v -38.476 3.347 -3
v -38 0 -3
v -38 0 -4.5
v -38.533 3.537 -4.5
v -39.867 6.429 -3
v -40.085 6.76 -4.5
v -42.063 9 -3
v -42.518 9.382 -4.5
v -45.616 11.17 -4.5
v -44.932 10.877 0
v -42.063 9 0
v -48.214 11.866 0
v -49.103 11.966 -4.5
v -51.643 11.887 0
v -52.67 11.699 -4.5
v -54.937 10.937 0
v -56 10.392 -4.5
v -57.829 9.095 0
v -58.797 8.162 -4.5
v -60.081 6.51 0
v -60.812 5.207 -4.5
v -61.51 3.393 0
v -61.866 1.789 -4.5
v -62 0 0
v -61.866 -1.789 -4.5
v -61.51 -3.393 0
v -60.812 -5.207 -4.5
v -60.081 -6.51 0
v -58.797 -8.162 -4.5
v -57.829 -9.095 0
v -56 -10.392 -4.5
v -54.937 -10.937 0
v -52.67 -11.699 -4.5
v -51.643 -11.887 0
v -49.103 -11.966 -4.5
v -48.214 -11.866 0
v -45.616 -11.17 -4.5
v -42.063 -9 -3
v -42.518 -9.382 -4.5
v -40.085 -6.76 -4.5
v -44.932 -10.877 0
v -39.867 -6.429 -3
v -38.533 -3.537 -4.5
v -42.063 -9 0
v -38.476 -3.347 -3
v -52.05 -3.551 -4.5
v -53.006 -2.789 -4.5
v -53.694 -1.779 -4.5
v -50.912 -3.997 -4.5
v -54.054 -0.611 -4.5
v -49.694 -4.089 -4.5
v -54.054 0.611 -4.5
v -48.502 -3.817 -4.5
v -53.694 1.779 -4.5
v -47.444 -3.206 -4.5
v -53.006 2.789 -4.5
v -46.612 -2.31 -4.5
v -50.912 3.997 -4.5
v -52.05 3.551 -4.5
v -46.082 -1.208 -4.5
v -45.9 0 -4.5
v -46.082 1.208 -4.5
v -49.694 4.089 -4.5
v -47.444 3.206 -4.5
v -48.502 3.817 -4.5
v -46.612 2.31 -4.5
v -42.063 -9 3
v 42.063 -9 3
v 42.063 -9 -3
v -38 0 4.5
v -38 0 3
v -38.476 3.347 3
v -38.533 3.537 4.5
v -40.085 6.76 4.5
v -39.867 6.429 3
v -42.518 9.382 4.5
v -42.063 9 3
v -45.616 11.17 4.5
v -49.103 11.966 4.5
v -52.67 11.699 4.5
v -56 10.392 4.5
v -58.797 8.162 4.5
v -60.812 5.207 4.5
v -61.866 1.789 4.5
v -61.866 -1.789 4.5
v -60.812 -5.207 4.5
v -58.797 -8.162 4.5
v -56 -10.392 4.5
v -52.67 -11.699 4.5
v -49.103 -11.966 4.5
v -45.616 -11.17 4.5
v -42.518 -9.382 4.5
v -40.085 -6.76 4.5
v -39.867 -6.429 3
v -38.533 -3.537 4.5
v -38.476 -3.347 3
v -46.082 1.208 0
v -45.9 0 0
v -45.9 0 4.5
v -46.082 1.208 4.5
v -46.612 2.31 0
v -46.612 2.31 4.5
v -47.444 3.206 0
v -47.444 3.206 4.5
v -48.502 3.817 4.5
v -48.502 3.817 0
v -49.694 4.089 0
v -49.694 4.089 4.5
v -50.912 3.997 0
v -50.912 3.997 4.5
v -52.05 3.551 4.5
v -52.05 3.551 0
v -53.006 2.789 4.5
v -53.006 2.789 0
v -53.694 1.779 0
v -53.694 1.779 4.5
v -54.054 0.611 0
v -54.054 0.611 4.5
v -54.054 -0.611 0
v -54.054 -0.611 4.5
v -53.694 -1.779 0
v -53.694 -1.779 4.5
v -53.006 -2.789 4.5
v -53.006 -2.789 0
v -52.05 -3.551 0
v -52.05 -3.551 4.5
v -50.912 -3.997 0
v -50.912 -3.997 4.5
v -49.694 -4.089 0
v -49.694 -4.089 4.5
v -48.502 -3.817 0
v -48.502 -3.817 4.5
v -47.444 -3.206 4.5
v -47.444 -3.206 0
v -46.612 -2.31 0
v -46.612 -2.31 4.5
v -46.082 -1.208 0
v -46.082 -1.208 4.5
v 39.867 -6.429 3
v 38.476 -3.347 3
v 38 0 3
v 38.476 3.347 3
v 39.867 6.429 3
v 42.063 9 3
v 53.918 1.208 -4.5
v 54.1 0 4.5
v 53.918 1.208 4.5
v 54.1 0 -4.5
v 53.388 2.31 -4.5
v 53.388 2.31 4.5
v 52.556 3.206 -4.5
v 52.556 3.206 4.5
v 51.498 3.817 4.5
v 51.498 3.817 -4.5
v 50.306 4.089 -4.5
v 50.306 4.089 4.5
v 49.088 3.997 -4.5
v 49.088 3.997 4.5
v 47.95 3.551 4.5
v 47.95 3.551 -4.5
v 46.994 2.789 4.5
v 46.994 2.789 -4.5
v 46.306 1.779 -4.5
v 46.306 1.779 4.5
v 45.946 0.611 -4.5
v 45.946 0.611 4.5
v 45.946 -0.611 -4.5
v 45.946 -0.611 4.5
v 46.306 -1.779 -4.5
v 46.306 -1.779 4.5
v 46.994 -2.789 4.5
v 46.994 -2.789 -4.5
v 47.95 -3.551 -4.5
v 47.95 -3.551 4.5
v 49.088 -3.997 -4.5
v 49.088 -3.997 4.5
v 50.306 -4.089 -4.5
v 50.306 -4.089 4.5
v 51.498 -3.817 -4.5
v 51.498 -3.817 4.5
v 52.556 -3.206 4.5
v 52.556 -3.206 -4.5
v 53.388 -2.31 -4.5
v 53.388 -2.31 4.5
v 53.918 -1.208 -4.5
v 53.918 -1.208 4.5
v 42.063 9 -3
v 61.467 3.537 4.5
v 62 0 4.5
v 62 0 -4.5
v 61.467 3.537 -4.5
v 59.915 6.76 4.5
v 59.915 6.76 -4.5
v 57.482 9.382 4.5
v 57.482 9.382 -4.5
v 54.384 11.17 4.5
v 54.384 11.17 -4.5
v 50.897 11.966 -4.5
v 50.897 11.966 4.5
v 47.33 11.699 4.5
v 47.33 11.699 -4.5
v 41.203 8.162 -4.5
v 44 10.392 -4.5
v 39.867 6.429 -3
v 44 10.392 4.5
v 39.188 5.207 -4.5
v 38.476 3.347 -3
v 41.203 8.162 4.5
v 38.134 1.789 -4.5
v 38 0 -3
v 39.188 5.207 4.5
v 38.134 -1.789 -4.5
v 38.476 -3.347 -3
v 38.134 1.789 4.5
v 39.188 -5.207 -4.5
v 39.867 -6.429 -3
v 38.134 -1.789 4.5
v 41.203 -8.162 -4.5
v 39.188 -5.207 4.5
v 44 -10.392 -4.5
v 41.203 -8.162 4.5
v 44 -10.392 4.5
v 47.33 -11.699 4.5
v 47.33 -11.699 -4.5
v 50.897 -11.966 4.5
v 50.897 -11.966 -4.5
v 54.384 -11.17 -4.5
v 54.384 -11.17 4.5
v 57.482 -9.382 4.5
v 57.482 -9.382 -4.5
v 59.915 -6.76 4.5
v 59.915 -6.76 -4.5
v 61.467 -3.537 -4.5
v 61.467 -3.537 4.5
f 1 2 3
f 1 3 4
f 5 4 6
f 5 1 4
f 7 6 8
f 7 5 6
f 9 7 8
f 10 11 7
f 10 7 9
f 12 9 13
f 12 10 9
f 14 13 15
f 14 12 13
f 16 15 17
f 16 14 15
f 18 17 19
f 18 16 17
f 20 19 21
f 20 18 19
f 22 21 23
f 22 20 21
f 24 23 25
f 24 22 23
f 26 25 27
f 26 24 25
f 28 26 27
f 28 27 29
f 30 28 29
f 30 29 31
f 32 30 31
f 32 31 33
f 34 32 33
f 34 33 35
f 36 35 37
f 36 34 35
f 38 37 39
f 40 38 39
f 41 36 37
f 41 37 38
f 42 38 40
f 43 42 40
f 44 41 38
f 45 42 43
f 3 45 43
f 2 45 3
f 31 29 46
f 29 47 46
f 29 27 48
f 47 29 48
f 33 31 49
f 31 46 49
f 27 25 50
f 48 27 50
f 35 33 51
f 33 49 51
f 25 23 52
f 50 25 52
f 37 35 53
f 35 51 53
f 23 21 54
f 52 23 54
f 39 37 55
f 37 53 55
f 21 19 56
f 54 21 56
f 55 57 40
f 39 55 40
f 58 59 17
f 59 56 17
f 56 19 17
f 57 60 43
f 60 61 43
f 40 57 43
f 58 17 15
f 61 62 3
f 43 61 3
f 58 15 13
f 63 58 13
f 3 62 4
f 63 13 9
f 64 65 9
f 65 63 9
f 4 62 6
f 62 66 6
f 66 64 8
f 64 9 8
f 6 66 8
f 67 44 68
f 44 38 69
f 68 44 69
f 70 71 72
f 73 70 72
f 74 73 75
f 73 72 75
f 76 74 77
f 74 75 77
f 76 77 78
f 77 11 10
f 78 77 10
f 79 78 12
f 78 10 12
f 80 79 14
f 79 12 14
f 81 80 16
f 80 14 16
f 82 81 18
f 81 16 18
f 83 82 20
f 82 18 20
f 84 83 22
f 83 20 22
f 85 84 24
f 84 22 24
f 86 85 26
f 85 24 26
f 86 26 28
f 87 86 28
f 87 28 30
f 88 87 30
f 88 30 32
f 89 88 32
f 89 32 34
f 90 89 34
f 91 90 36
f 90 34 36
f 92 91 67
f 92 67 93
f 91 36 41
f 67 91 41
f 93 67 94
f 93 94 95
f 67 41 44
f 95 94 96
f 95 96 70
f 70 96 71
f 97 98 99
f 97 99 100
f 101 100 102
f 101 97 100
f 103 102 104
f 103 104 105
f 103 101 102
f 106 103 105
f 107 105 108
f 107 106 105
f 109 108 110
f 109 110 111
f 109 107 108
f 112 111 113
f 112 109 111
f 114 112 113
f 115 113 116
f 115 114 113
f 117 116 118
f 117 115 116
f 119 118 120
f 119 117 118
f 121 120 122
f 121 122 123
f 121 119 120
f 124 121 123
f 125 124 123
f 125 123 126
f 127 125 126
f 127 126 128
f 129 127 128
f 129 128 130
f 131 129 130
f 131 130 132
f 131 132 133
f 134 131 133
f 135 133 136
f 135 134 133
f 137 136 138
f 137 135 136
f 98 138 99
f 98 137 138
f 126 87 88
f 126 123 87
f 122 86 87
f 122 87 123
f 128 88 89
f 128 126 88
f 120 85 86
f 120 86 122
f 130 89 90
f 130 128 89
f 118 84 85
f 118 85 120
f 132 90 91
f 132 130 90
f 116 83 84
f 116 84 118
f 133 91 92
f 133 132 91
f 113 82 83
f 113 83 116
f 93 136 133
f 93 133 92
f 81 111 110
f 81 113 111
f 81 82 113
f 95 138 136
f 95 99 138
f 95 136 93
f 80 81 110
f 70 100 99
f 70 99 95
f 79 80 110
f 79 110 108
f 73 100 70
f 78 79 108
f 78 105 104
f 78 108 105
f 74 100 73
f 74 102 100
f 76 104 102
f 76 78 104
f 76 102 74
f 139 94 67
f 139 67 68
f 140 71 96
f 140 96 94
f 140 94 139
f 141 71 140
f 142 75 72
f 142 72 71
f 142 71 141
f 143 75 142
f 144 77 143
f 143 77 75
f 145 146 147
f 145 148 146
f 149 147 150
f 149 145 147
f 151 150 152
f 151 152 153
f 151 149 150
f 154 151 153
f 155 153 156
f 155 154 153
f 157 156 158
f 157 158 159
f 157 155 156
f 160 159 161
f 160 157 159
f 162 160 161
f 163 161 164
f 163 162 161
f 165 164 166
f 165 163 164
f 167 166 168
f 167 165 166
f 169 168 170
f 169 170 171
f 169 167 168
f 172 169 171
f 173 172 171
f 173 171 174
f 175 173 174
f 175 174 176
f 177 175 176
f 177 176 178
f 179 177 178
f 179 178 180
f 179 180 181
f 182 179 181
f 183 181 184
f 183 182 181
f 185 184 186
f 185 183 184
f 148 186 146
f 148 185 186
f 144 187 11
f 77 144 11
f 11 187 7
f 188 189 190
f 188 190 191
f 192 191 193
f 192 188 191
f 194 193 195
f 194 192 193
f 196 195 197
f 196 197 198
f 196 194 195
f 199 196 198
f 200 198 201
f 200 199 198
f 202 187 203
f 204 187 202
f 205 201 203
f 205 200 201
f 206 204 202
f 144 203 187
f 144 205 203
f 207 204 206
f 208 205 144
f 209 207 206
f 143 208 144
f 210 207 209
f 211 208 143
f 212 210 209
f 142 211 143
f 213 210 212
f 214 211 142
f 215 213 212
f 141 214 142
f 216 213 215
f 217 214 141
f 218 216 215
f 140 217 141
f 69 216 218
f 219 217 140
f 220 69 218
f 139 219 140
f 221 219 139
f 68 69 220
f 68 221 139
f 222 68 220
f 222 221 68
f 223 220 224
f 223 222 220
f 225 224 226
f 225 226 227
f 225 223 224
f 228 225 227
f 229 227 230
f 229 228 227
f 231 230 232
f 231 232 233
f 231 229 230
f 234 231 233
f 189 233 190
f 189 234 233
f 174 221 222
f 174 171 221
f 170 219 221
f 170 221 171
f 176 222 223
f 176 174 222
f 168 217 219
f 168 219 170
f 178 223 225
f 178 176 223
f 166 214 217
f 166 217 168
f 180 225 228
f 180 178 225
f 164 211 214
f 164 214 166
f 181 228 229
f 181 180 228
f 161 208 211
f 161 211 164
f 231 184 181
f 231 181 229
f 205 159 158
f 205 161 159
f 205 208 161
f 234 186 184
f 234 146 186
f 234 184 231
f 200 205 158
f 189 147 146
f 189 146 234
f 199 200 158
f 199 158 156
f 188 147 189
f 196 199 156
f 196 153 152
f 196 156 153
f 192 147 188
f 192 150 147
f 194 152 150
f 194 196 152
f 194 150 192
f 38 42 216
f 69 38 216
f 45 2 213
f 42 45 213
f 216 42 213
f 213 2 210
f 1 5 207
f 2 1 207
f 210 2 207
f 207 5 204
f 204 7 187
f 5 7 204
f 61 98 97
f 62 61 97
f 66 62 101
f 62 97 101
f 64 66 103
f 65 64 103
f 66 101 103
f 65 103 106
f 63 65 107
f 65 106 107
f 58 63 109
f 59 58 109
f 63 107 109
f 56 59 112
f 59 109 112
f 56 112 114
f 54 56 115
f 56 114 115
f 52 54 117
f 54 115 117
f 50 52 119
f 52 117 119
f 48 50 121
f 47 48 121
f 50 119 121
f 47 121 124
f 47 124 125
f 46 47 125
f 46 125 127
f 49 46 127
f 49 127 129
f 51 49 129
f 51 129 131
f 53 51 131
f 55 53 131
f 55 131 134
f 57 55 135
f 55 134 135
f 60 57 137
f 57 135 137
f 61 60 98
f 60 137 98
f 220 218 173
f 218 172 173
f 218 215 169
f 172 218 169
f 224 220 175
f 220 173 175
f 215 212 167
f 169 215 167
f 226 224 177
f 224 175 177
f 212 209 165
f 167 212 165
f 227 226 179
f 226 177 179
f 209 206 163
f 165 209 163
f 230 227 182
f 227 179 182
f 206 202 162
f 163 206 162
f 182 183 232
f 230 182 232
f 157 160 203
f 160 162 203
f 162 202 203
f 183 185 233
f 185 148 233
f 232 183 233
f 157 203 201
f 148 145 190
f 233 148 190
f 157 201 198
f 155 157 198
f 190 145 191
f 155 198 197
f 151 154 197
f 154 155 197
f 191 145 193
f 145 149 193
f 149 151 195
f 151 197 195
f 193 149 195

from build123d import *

# Parameters (mm, degrees)
EXTRUDE_1_DEPTH      = 3
EXTRUDE_1_DEPTH_BACK = 3
SKETCH_1_4_R         = 12
SKETCH_1_4_R_2       = 4.1
EXTRUDE_2_DEPTH      = 4.5


with BuildPart() as part:
    # 草图1 → 凸台-拉伸1 (new, two sides: drawn at the far end of the back side and taken through both)
    with BuildSketch(Plane.XY.offset(-EXTRUDE_1_DEPTH_BACK)):
        with BuildLine():
            Line((42.062746067, 9), (-42.062746067, 9))
            ThreePointArc((-42.062746067, 9), (-39.062746067, 4.937253933), (-38, 0))
            ThreePointArc((-38, 0), (-39.062746067, -4.937253933), (-42.062746067, -9))
            Line((-42.062746067, -9), (42.062746067, -9))
            ThreePointArc((42.062746067, -9), (38, 0), (42.062746067, 9))
        make_face()
    extrude(amount=EXTRUDE_1_DEPTH + EXTRUDE_1_DEPTH_BACK)

    # 草图1<4> → 凸台-拉伸2 (add, symmetric)
    # profile 1 of 2: a face of its own
    with BuildSketch(Plane.XY):
        with Locations((-50, 0)):
            Circle(SKETCH_1_4_R)
        with Locations((-50, 0)):
            Circle(SKETCH_1_4_R_2, mode=Mode.SUBTRACT)
    # profile 2 of 2: a face of its own
    with BuildSketch(Plane.XY):
        with Locations((50, 0)):
            Circle(SKETCH_1_4_R)
        with Locations((50, 0)):
            Circle(SKETCH_1_4_R_2, mode=Mode.SUBTRACT)
    extrude(amount=EXTRUDE_2_DEPTH, both=True)


solid = part.part
